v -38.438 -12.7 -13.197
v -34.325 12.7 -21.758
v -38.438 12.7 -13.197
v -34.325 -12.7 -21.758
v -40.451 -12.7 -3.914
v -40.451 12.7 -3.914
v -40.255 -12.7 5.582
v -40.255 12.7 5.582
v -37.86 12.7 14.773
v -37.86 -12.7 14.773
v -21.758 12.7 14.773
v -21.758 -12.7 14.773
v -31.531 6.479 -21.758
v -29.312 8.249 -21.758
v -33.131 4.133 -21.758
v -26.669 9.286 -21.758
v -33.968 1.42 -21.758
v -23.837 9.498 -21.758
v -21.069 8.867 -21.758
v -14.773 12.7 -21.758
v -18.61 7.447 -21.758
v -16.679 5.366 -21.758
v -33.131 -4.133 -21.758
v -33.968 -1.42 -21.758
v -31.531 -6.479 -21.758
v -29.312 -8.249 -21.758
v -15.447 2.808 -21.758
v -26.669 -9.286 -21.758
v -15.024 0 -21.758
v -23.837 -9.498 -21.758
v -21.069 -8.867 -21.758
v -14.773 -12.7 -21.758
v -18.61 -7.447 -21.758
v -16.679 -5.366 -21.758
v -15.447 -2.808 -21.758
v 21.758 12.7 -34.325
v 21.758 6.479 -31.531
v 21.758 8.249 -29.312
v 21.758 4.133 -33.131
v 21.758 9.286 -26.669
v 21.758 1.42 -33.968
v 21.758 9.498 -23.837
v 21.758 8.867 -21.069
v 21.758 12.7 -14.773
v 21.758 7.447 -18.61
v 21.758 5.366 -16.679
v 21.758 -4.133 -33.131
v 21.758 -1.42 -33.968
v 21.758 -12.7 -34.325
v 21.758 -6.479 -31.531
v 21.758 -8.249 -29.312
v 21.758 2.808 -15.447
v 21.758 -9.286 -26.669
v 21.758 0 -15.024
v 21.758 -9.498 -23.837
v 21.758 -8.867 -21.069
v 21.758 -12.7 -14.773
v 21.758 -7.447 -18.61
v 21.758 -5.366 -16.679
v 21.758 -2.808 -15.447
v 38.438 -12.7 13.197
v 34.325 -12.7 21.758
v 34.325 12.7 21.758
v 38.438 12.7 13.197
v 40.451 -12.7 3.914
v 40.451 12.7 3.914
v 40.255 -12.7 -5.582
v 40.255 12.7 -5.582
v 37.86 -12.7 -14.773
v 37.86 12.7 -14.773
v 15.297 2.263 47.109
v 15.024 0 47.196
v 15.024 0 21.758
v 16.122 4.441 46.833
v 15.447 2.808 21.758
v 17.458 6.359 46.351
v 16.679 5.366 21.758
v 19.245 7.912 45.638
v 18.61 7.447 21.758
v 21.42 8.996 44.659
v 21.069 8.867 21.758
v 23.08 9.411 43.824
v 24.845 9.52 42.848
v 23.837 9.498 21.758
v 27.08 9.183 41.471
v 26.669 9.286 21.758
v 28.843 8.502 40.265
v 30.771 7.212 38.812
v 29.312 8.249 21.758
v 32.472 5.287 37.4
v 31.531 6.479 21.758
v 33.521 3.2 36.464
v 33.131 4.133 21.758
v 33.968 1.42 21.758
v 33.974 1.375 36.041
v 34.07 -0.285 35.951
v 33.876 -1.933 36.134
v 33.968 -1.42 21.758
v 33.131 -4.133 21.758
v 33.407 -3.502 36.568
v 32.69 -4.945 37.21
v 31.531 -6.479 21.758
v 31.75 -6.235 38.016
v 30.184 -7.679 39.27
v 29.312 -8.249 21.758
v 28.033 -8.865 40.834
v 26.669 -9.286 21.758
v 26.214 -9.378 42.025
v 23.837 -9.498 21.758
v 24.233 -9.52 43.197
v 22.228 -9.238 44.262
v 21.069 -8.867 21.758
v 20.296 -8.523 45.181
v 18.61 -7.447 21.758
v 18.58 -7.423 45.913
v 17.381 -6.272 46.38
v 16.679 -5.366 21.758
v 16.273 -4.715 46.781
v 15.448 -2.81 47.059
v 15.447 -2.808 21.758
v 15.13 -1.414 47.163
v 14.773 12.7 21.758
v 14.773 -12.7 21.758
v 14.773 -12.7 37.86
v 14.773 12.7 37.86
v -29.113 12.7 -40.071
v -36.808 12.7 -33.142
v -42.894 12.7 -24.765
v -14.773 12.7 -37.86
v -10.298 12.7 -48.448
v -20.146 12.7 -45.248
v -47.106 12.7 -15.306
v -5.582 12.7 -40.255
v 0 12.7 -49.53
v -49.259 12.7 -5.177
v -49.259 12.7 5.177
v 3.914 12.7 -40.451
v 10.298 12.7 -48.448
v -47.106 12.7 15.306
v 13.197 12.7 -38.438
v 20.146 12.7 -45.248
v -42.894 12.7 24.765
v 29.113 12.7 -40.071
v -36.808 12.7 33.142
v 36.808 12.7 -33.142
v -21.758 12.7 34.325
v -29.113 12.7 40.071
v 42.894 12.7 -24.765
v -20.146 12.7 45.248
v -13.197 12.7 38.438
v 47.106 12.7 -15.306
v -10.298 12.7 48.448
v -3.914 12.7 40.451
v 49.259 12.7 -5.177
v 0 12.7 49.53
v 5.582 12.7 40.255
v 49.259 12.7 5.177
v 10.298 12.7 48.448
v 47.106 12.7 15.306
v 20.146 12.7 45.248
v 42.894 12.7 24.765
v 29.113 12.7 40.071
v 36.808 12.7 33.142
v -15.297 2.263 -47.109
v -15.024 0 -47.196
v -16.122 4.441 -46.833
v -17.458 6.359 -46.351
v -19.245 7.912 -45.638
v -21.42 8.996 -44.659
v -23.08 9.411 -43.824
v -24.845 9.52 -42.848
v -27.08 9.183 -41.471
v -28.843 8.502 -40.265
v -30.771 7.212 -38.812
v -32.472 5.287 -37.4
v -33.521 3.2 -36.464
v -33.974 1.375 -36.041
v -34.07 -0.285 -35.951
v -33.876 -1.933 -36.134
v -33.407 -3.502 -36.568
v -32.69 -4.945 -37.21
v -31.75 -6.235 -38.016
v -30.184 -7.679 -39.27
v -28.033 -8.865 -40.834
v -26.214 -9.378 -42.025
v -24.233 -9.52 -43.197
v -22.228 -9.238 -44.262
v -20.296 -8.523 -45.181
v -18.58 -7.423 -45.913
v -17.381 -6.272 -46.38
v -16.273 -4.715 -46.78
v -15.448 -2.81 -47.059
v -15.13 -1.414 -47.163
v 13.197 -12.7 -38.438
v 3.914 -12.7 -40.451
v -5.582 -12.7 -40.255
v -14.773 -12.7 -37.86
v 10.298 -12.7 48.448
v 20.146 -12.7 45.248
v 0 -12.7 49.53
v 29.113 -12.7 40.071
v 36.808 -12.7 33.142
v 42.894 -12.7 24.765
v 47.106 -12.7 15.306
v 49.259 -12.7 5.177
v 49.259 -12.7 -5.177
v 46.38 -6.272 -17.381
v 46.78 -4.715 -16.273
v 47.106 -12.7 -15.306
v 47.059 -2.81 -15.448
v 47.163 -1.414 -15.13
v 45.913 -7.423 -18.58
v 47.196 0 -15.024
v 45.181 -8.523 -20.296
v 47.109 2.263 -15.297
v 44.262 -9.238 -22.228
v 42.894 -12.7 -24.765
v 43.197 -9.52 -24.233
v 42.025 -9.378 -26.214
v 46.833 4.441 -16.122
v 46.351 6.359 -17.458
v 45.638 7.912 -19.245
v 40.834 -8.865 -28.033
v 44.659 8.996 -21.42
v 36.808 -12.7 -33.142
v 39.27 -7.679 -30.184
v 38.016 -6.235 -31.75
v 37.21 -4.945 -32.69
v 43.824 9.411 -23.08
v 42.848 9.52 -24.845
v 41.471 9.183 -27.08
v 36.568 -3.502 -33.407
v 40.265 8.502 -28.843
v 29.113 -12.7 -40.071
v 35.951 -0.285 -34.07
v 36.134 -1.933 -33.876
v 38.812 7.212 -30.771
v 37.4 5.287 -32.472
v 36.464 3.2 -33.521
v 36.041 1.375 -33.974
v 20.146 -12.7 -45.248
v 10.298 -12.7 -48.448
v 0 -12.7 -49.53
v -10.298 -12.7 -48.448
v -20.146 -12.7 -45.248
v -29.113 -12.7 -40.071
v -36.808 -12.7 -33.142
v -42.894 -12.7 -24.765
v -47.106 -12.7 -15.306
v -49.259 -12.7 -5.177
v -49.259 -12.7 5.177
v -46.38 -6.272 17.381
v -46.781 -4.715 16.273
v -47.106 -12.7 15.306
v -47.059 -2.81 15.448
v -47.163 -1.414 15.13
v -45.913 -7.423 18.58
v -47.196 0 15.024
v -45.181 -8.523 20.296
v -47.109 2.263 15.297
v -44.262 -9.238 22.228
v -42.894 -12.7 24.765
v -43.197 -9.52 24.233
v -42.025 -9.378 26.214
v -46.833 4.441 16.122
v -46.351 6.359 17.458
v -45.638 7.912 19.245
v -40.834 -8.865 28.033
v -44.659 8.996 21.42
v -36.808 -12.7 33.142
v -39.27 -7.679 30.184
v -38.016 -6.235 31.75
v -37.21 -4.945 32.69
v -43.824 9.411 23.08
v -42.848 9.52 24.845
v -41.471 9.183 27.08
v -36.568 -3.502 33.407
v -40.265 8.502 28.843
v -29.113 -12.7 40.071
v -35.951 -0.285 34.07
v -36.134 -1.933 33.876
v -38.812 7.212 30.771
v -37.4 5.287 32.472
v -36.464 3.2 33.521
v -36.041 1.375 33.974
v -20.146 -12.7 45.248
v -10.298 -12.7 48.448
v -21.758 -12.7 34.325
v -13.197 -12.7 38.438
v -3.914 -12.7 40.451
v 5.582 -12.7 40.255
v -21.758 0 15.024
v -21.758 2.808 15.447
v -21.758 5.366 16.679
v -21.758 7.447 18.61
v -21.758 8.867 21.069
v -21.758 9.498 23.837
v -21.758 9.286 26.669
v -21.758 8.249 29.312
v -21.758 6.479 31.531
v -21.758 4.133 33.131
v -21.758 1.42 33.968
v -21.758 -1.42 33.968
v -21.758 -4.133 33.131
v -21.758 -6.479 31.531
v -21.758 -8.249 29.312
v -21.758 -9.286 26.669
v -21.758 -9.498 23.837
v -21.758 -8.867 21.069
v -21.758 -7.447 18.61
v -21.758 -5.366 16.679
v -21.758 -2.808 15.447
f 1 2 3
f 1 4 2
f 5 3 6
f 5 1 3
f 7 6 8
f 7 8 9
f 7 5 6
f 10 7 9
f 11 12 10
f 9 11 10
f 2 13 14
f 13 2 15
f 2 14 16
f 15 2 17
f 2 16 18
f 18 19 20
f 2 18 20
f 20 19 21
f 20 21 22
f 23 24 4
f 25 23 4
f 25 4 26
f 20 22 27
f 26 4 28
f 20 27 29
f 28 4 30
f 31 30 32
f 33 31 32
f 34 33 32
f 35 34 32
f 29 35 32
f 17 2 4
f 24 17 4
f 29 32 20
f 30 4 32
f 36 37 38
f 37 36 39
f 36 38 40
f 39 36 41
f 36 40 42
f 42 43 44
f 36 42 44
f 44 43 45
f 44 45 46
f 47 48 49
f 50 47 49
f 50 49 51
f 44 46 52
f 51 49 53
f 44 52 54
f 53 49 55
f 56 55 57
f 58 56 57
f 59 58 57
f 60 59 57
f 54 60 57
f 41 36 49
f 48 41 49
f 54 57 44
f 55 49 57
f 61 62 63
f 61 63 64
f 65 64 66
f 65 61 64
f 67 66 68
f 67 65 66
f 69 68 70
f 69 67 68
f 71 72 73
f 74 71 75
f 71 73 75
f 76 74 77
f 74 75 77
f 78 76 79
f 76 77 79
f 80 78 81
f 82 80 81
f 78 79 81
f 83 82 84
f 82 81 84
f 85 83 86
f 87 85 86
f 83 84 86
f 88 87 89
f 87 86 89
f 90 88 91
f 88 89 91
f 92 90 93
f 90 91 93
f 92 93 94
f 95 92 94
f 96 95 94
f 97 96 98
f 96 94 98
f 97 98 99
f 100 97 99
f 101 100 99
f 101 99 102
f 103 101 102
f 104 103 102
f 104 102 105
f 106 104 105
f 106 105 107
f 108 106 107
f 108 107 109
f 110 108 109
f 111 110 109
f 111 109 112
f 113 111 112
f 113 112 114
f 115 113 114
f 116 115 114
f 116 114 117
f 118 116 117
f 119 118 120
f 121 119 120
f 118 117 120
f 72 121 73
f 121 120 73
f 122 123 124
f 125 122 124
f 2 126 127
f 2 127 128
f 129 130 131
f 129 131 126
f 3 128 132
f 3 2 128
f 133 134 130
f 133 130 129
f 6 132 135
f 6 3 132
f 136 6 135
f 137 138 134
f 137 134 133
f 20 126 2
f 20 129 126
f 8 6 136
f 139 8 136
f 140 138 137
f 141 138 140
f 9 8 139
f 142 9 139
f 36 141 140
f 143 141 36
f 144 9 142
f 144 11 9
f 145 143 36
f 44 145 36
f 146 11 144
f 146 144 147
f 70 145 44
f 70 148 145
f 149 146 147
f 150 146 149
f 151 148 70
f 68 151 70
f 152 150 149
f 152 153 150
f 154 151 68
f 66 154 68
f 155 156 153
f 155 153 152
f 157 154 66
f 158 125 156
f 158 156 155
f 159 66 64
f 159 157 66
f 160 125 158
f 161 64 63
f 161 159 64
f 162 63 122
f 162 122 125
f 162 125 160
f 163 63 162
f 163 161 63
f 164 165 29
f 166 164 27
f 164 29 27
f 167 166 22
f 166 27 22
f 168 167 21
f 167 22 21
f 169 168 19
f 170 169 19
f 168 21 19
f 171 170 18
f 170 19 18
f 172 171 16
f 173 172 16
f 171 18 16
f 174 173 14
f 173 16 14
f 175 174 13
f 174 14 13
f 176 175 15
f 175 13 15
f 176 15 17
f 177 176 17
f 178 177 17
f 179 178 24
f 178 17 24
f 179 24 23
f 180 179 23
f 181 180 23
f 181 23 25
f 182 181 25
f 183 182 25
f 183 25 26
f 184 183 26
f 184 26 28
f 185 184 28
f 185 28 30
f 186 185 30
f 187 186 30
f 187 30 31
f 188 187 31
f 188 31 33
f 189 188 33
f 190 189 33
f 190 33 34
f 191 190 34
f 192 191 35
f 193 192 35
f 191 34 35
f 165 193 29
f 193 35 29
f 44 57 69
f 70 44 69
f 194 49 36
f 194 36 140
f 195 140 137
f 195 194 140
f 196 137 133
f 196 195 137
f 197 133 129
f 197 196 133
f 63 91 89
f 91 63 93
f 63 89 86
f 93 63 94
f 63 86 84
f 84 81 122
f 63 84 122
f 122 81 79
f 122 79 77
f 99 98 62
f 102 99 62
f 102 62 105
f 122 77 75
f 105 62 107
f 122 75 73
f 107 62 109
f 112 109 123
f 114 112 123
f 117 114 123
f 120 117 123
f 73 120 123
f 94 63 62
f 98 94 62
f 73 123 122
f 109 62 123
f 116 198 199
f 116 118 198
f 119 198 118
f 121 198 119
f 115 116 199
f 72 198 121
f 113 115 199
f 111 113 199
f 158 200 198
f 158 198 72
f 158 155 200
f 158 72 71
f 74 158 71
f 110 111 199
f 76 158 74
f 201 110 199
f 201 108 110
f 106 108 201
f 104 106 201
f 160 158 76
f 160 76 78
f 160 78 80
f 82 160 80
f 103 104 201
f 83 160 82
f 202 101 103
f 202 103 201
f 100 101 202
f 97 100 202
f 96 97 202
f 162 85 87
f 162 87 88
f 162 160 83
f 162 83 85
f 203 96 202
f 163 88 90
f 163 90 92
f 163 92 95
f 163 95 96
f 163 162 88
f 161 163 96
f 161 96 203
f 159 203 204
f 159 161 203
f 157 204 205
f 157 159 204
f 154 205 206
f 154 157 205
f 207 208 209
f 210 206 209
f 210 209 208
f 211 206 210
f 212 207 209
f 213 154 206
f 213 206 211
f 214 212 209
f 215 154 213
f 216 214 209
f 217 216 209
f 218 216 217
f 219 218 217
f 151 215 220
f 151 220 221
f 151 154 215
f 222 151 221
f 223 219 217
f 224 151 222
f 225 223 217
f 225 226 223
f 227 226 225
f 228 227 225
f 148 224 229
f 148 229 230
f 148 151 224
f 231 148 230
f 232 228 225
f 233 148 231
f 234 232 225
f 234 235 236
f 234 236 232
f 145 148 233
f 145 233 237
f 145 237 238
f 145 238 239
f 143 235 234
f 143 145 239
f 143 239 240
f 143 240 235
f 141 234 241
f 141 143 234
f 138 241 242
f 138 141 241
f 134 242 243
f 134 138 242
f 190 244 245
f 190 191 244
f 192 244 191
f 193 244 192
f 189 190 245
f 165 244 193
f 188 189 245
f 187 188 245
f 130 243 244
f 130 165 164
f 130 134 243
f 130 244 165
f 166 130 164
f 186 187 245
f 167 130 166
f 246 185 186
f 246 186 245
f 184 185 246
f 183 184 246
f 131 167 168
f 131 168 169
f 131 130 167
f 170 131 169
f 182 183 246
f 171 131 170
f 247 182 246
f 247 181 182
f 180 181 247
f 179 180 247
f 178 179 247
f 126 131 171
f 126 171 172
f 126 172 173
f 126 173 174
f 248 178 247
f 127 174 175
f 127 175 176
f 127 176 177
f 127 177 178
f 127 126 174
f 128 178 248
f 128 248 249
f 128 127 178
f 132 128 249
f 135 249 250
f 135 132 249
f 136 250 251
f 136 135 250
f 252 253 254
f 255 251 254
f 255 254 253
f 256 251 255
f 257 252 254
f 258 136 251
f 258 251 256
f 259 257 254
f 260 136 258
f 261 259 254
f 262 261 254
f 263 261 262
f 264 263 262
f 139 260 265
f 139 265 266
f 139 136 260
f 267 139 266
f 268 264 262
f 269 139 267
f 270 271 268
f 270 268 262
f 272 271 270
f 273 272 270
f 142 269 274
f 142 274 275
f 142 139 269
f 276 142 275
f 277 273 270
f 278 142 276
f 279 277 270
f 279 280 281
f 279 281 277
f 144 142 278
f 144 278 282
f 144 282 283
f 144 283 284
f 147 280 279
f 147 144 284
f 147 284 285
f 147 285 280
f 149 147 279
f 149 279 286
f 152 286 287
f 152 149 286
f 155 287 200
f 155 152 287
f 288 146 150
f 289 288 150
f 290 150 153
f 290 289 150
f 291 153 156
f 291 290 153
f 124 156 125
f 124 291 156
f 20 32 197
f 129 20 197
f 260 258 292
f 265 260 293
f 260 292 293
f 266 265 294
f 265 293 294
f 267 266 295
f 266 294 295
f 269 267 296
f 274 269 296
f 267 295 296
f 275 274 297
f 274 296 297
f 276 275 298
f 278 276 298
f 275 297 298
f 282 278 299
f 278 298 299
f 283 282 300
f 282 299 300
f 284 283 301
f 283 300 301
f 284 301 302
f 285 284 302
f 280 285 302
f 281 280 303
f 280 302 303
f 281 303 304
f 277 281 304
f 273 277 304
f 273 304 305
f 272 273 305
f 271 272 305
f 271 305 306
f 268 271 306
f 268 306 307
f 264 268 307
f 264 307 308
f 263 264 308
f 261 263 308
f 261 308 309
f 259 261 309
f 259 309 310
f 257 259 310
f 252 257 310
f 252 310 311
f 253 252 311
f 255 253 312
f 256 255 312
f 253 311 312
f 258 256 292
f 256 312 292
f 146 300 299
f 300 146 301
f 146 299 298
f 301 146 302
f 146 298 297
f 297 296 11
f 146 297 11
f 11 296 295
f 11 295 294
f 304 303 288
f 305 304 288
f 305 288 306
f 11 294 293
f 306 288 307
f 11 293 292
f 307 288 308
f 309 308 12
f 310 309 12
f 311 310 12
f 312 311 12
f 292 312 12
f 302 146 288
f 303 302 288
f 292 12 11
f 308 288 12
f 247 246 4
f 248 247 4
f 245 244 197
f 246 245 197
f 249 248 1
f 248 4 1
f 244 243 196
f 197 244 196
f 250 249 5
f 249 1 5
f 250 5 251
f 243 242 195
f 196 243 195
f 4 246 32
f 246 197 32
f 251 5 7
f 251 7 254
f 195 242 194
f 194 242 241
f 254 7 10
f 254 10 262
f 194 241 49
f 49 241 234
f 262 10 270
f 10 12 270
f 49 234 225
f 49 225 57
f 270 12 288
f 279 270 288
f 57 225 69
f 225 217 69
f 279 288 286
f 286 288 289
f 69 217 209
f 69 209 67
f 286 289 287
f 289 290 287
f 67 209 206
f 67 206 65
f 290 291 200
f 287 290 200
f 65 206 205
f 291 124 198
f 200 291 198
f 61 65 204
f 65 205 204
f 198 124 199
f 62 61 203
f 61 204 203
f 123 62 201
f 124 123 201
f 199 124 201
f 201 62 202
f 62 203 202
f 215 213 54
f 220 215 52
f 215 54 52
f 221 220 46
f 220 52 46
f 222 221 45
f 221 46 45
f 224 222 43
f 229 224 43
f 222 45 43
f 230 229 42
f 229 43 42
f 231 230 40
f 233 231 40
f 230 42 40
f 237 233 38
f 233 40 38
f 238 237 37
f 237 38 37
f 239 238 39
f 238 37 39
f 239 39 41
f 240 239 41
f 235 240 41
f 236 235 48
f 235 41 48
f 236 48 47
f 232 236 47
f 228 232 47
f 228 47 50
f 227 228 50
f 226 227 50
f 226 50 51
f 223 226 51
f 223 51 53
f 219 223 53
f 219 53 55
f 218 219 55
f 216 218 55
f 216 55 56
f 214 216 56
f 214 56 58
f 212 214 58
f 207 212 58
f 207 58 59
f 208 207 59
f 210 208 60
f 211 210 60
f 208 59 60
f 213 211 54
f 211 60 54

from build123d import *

# Parameters (mm, degrees)
SKETCH1_R           = 49.53
SKETCH1_R_2         = 40.64
BOSS_EXTRUDE1_DEPTH = 12.7
BOSS_EXTRUDE2_DEPTH = 12.7
SKETCH3_R           = 9.525
CUT_EXTRUDE1_DEPTH  = 88.729988813
CIRPATTERN1_COUNT   = 4


with BuildPart() as part:
    # Sketch1 → Boss-Extrude1 (new, symmetric)
    with BuildSketch(Plane(origin=(0, 0, 0), x_dir=(1, 0, 0), z_dir=(0, 1, 0))):
        Circle(SKETCH1_R)
        Circle(SKETCH1_R_2, mode=Mode.SUBTRACT)
    extrude(amount=BOSS_EXTRUDE1_DEPTH, both=True)

    # Sketch2 → Boss-Extrude2 (add, symmetric)
    with BuildSketch(Plane(origin=(0, 0, 0), x_dir=(1, 0, 0), z_dir=(0, 1, 0))):
        with BuildLine():
            Line((43.786890952, -21.758428384), (14.773428494, -21.758428384))
            Line((14.773428494, -21.758428384), (14.773428494, -43.348428384))
            Line((14.773428494, -43.348428384), (22.619345296, -43.348428384))
            ThreePointArc((22.619345296, -43.348428384), (34.913880881, -34.230716423), (43.786890952, -21.758428384))
        make_face()
        with BuildLine():
            Line((-21.758428494, -43.786890898), (-21.758428494, -14.773428384))
            Line((-21.758428494, -14.773428384), (-43.348428494, -14.773428384))
            Line((-43.348428494, -14.773428384), (-43.348428494, -22.619345087))
            ThreePointArc((-43.348428494, -22.619345087), (-34.230716551, -34.913880755), (-21.758428494, -43.786890898))
        make_face()
        with BuildLine():
            Line((21.758428494, 14.773428384), (43.348428494, 14.773428384))
            Line((43.348428494, 14.773428384), (43.348428494, 22.619345087))
            ThreePointArc((43.348428494, 22.619345087), (34.230716551, 34.913880755), (21.758428494, 43.786890898))
            Line((21.758428494, 43.786890898), (21.758428494, 14.773428384))
        make_face()
        with BuildLine():
            Line((-43.786890952, 21.758428384), (-14.773428494, 21.758428384))
            Line((-14.773428494, 21.758428384), (-14.773428494, 43.348428384))
            Line((-14.773428494, 43.348428384), (-22.619345296, 43.348428384))
            ThreePointArc((-22.619345296, 43.348428384), (-34.913880881, 34.230716423), (-43.786890952, 21.758428384))
        make_face()
    extrude(amount=BOSS_EXTRUDE2_DEPTH, both=True)

    # Sketch3 → Cut-Extrude1 (cut, through all)
    with BuildSketch(Plane(origin=(-21.758428494, 0, 0), x_dir=(0, 0, -1), z_dir=(1, 0, 0))):
        with Locations((-24.549030393, 0)):
            Circle(SKETCH3_R)
    cut_extrude1 = extrude(amount=-CUT_EXTRUDE1_DEPTH, mode=Mode.SUBTRACT)

    # CirPattern1: Cut-Extrude1 ×4 about axis
    cirpattern1_axis = Axis((0, 12.7, 0), (0, 1, 0))
    for i in range(1, CIRPATTERN1_COUNT):
        add(cut_extrude1.rotate(cirpattern1_axis, i * 360 / CIRPATTERN1_COUNT), mode=Mode.SUBTRACT)


solid = part.part
